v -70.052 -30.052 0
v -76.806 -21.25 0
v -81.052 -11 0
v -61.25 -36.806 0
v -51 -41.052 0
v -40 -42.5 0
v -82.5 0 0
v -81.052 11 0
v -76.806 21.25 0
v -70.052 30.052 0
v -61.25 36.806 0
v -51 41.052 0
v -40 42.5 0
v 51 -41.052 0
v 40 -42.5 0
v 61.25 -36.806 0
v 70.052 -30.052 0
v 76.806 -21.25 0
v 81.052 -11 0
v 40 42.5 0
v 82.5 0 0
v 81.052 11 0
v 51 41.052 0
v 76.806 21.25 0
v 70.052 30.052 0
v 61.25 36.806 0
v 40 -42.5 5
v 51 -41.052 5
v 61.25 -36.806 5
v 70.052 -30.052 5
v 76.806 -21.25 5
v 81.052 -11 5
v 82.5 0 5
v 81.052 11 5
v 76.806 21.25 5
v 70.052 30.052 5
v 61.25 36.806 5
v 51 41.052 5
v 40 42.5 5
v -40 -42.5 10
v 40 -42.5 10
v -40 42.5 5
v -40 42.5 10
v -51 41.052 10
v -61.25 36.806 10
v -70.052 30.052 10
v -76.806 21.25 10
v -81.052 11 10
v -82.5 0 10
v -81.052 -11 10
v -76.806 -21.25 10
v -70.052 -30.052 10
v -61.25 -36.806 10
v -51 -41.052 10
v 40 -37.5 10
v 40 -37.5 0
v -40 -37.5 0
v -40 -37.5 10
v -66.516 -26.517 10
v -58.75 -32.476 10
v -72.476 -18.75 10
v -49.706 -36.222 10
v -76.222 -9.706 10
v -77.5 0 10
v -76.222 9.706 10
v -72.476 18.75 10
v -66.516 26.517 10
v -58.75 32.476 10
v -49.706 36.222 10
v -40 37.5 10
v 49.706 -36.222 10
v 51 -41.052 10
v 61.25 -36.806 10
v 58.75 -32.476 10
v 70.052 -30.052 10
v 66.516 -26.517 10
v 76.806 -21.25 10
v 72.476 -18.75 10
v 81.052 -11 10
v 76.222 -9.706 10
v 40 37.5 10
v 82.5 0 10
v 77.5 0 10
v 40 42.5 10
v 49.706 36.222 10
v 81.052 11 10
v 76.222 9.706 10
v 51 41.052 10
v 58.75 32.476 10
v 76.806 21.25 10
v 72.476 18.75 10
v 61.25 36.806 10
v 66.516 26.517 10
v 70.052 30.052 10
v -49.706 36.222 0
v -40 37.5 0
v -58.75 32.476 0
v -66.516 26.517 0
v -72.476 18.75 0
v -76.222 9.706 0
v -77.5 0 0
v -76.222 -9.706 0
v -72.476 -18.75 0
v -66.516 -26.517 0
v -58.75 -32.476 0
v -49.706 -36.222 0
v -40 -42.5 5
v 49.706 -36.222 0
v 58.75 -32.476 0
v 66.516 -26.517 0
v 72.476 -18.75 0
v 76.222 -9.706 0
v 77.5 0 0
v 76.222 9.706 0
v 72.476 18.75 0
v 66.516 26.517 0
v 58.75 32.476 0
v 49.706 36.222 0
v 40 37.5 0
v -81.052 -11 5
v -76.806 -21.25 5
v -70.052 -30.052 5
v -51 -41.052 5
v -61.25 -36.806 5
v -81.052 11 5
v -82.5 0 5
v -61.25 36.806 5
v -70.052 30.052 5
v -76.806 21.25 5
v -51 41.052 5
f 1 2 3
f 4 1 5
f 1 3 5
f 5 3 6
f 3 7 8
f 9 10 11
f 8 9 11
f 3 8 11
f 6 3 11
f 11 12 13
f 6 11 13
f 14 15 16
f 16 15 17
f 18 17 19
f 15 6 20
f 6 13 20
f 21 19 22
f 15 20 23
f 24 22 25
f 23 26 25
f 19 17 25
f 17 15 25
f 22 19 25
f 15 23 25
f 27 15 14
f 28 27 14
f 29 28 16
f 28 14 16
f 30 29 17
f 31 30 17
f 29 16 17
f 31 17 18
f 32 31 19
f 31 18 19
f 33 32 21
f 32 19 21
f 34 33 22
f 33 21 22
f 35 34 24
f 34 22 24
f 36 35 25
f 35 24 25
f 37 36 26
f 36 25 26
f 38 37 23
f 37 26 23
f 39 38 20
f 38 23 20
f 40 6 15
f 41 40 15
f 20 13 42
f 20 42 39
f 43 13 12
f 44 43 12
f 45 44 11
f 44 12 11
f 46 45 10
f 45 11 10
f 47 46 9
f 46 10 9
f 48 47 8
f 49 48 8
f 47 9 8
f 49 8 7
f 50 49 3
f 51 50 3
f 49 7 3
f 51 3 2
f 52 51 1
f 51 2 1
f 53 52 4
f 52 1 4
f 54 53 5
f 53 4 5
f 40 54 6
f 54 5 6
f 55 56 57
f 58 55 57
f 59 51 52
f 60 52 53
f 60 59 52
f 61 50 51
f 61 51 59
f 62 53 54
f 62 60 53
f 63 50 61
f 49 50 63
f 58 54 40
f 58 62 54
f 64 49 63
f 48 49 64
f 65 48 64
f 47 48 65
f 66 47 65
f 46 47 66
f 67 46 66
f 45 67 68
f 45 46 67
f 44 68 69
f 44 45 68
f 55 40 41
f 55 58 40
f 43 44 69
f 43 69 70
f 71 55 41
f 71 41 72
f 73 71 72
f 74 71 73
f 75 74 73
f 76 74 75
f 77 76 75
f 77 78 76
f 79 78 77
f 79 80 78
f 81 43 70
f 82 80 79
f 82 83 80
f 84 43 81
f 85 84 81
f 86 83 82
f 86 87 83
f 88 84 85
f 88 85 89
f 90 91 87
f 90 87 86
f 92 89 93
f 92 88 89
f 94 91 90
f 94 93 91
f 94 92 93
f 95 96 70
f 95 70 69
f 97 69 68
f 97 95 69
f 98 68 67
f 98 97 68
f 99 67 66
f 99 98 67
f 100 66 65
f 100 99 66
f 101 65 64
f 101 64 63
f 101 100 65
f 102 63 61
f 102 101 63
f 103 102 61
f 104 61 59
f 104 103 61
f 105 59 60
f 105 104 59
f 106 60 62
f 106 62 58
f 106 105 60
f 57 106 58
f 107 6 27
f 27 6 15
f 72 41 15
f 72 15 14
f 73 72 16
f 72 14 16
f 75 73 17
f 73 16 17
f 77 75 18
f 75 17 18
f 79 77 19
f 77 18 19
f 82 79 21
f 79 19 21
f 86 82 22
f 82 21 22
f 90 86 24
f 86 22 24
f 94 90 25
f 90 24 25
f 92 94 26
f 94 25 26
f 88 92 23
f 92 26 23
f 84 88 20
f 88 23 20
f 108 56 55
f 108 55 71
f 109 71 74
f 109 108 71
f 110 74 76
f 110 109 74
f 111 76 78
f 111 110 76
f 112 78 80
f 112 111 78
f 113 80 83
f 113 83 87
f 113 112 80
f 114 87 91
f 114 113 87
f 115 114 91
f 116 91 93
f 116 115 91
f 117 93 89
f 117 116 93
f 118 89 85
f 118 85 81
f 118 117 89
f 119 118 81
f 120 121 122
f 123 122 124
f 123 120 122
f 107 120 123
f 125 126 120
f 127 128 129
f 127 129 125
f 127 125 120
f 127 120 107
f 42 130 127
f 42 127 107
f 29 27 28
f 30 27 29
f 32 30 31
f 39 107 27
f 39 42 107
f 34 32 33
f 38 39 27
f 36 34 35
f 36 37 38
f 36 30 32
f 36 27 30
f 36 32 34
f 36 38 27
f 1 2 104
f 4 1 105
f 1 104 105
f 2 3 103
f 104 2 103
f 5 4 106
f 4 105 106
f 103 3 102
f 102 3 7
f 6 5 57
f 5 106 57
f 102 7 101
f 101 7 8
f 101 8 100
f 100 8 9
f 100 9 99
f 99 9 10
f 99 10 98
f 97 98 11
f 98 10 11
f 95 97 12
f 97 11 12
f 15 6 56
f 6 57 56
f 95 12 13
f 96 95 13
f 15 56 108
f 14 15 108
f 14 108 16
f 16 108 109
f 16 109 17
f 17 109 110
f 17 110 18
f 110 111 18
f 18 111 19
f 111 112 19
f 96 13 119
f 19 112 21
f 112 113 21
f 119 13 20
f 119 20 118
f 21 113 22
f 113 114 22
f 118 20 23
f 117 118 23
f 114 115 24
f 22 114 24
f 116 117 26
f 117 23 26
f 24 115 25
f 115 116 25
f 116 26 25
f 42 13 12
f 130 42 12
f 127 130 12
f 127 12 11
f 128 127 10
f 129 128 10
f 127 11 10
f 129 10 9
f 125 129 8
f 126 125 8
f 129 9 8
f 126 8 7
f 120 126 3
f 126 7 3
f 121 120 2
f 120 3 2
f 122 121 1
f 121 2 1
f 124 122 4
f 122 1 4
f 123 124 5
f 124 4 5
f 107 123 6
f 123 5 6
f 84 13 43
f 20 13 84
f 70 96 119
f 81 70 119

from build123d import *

# Parameters (mm, degrees)
PAD_DEPTH    = 10
PAD001_DEPTH = 5


with BuildPart() as k_rper:
    # Sketch → Pad (new body)
    with BuildSketch(Plane.XY):
        with BuildLine():
            ThreePointArc((-39.999965, 42.5), (-82.499965, -1e-06), (-39.999962, -42.5))
            Line((-39.999962, -42.5), (39.999965, -42.5))
            ThreePointArc((39.999965, -42.5), (82.499965, -3.5e-05), (40.000035, 42.5))
            Line((-39.999965, 42.5), (40.000035, 42.5))
        make_face()
        with BuildLine():
            ThreePointArc((-39.999962, 37.5), (-77.499965, 1e-06), (-39.999965, -37.5))
            Line((39.999962, -37.5), (-39.999965, -37.5))
            ThreePointArc((39.999962, -37.5), (77.499965, -1e-06), (39.999965, 37.5))
            Line((-39.999962, 37.5), (39.999965, 37.5))
        make_face(mode=Mode.SUBTRACT)
    extrude(amount=PAD_DEPTH)


with BuildPart() as k_rper001:
    # Sketch001 → Pad001 (new body)
    with BuildSketch(Plane.XY):
        with BuildLine():
            ThreePointArc((-40, 42.5), (-82.5, -3.3e-05), (-39.999935, -42.5))
            Line((-39.999935, -42.5), (40, -42.5))
            ThreePointArc((40, -42.5), (82.5, 0), (40, 42.5))
            Line((-40, 42.5), (40, 42.5))
        make_face()
    extrude(amount=PAD001_DEPTH)


solid = Compound([k_rper.part, k_rper001.part])
